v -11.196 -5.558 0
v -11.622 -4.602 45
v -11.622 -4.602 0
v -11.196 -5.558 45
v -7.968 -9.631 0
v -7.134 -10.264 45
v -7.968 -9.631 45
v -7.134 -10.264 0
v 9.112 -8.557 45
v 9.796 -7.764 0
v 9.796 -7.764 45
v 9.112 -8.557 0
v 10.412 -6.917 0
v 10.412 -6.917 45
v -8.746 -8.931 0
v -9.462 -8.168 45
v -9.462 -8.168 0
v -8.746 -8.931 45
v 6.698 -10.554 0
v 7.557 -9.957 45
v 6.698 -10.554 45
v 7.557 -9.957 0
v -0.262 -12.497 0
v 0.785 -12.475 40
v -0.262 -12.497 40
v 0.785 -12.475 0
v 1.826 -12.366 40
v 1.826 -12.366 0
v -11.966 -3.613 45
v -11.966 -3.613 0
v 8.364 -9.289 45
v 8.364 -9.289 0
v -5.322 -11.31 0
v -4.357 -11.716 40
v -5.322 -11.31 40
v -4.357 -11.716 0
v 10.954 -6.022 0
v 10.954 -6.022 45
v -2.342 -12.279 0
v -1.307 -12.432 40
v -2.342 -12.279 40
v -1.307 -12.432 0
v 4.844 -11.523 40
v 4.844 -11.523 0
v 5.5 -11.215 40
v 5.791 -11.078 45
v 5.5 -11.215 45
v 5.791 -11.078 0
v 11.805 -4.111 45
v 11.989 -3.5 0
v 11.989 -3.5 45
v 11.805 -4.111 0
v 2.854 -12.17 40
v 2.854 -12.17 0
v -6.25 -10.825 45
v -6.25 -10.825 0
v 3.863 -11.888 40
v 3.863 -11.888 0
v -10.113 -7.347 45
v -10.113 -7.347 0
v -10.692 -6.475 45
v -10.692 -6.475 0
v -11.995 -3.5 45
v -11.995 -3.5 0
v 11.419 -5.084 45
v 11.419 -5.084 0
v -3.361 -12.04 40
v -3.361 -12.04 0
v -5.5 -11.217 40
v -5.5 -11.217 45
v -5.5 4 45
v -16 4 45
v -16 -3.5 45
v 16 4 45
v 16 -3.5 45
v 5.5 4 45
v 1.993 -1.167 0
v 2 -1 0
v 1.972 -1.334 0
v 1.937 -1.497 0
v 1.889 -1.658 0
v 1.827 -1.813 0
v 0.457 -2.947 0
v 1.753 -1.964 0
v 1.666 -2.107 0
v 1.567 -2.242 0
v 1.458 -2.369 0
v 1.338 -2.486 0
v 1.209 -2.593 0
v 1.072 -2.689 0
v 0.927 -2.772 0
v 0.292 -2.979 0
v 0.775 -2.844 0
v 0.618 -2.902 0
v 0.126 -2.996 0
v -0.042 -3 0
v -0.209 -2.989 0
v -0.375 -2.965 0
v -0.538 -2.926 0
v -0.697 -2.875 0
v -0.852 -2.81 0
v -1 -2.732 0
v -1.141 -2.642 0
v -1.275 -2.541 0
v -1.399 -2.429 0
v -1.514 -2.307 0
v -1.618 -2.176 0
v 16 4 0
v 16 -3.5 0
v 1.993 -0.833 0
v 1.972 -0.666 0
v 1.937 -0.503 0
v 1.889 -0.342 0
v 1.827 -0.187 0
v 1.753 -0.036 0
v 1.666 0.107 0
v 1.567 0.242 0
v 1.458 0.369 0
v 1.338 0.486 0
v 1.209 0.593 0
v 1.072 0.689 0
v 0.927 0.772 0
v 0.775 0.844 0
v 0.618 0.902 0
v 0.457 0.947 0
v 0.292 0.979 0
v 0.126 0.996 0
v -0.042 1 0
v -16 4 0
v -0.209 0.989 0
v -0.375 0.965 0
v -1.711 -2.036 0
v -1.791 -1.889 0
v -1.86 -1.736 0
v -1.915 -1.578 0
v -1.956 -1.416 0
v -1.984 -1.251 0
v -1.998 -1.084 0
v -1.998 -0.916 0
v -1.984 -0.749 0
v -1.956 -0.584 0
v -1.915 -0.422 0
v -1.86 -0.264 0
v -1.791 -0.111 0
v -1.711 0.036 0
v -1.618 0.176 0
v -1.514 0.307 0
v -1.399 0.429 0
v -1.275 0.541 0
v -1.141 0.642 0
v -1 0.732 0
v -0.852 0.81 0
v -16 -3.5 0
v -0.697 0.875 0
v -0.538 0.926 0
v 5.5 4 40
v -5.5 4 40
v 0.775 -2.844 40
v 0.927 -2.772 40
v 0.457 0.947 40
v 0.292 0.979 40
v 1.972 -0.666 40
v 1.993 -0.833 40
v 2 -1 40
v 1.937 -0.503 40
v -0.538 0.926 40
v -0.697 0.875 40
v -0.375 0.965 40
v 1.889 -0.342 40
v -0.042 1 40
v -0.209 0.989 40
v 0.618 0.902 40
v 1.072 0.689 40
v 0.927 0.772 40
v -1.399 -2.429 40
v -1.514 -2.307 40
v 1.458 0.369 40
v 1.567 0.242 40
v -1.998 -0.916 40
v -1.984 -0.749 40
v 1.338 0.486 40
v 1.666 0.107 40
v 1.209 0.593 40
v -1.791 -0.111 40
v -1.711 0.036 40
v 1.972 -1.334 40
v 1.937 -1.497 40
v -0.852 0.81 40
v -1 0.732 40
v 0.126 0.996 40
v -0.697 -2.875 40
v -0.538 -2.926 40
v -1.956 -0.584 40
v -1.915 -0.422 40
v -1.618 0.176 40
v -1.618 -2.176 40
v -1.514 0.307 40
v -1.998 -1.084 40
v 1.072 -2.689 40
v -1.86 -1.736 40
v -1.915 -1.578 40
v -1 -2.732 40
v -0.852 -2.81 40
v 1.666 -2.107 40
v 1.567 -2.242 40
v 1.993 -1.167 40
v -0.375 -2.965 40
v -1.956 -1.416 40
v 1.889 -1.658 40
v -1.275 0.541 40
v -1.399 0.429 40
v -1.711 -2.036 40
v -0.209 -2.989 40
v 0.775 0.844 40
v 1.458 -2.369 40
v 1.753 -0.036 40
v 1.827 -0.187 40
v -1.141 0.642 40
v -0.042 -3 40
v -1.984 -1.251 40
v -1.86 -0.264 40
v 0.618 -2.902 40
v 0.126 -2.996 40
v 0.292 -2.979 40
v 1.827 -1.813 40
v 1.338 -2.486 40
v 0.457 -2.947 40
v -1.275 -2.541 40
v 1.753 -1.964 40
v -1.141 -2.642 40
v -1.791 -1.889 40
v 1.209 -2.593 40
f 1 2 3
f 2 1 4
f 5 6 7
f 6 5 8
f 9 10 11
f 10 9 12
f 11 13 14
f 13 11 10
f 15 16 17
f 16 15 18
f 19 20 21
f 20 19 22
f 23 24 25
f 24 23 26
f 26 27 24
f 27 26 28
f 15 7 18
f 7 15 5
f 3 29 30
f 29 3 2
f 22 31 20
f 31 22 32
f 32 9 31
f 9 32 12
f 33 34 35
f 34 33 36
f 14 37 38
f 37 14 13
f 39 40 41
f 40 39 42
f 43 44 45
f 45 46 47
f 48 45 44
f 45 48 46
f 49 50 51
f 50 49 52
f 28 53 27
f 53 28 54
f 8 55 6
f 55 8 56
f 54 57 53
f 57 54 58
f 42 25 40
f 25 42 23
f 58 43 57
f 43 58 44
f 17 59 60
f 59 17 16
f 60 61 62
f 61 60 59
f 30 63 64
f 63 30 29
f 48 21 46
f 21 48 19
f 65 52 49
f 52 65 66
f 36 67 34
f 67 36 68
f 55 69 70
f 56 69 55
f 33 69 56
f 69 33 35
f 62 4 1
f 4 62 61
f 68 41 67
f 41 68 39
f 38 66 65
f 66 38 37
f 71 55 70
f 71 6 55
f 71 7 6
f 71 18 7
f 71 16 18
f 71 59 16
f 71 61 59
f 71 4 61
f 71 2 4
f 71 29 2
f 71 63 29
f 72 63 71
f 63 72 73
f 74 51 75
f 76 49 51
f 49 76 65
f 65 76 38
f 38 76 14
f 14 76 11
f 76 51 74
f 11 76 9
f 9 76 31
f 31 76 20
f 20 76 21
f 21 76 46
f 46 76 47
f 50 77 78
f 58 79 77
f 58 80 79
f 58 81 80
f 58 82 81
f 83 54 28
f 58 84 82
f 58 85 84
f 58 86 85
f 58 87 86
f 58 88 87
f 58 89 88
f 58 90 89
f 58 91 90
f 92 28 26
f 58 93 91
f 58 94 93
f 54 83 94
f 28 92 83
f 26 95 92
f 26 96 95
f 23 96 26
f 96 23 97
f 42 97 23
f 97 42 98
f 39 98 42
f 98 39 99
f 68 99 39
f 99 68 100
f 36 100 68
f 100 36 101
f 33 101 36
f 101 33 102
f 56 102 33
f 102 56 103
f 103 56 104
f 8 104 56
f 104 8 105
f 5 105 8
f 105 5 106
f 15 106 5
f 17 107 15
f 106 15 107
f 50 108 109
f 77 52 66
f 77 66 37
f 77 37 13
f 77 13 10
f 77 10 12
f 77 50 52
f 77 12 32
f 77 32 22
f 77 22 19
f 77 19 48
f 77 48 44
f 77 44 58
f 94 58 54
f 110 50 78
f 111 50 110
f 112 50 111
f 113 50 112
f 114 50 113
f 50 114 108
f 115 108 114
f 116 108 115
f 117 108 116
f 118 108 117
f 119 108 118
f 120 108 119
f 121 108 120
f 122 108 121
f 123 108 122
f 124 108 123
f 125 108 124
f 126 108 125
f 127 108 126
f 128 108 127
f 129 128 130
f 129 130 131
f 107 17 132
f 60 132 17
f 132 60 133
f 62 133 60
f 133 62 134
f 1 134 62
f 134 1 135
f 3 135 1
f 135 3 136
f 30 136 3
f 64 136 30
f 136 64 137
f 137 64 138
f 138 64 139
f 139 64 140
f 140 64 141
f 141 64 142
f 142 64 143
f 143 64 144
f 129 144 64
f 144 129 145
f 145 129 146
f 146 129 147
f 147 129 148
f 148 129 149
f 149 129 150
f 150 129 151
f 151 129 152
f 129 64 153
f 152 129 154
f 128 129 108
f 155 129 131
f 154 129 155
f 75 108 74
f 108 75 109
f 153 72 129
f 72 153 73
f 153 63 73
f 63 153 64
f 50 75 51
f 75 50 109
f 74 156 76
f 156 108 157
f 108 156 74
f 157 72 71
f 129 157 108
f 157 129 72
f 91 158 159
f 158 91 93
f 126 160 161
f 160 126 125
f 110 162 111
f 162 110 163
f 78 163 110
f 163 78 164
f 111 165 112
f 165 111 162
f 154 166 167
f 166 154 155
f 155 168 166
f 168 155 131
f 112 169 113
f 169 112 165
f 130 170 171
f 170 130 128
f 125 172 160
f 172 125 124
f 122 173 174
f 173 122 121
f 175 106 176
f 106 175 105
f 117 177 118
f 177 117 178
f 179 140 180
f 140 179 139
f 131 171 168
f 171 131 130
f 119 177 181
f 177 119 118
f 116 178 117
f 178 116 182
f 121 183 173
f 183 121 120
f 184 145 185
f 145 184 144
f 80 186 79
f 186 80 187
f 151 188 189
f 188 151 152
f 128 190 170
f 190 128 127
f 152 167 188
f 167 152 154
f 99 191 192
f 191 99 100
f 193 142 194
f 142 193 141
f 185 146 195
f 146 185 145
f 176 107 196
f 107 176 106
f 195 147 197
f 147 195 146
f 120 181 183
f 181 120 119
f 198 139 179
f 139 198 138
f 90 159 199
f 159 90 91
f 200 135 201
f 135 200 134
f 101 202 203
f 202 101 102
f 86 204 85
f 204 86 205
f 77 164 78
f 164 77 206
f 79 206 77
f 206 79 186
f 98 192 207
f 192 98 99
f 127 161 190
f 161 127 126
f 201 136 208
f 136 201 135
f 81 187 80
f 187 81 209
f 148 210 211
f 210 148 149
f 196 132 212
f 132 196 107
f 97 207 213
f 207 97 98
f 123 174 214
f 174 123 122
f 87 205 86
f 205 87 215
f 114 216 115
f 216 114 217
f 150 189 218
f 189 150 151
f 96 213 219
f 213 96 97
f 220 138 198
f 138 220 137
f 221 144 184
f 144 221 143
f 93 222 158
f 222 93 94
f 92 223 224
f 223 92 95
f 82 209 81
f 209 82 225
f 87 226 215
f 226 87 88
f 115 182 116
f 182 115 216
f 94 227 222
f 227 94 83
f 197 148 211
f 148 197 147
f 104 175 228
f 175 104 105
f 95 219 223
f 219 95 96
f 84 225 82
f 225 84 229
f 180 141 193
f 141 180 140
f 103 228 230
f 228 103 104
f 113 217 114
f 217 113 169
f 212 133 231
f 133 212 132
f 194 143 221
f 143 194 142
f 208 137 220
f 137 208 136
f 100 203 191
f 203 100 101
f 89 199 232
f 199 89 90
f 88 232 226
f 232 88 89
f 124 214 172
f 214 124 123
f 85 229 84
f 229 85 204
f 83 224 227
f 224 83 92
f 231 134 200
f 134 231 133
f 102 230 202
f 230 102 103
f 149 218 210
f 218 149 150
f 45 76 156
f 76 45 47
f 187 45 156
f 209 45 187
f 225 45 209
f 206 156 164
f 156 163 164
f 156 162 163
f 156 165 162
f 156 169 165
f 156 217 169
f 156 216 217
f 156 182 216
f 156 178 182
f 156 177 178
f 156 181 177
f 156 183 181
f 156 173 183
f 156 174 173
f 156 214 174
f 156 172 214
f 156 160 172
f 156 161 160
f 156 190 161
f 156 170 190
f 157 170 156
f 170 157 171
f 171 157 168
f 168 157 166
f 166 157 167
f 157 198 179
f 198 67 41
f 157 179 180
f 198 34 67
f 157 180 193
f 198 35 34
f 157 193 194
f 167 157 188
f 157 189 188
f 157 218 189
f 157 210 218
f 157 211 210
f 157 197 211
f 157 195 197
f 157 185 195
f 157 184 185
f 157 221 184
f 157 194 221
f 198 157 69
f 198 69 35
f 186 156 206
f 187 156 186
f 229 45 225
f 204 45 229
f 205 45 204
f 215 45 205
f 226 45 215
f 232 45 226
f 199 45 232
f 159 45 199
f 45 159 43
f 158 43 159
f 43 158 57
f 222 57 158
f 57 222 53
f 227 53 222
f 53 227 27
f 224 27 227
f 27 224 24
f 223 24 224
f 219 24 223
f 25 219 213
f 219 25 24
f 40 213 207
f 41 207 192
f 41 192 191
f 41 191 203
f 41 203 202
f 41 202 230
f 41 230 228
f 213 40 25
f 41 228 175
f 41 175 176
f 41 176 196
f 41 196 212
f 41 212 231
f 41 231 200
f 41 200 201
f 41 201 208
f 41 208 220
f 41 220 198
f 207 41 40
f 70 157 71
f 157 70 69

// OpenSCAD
/*
 * 18650 button-top adapter for Tenergy universal charger
 *
 * How can it be "universal" if it can't hold an 18650 button-top battery?
 */
$fn=75;


neg_term_width=11;
neg_term_notch=5;
adapt_d=25;
adapt_r=adapt_d/2;
adapt_h=16;
adapt_l=40+neg_term_notch;
screw_d=4;
arc_d=9;
top_w=32;

/* Adapter to fit charger that routes contacts through wires to cell holder */
module charger_adapter() {
  difference() {
    union() {
      cylinder(d=adapt_d,h=adapt_l);
      translate([-top_w/2,-(adapt_r-arc_d),0]) {
        cube([top_w,top_w,adapt_l]);
      }
    }
    translate([-((top_w+2)/2),4,-1]) {
      cube([top_w+2,top_w,adapt_l+2]);
    }
    translate([0,-1,-1]) {
      cylinder(d=screw_d,h=adapt_l+2);
    }
    translate([0,0,adapt_l-neg_term_notch+neg_term_notch]) {
      cube([neg_term_width,adapt_d+2,neg_term_notch*2], center=true);
    }
  }
}

/* Cell holder for 18650 button-top battery */
module cell_holder() {
}

charger_adapter();
